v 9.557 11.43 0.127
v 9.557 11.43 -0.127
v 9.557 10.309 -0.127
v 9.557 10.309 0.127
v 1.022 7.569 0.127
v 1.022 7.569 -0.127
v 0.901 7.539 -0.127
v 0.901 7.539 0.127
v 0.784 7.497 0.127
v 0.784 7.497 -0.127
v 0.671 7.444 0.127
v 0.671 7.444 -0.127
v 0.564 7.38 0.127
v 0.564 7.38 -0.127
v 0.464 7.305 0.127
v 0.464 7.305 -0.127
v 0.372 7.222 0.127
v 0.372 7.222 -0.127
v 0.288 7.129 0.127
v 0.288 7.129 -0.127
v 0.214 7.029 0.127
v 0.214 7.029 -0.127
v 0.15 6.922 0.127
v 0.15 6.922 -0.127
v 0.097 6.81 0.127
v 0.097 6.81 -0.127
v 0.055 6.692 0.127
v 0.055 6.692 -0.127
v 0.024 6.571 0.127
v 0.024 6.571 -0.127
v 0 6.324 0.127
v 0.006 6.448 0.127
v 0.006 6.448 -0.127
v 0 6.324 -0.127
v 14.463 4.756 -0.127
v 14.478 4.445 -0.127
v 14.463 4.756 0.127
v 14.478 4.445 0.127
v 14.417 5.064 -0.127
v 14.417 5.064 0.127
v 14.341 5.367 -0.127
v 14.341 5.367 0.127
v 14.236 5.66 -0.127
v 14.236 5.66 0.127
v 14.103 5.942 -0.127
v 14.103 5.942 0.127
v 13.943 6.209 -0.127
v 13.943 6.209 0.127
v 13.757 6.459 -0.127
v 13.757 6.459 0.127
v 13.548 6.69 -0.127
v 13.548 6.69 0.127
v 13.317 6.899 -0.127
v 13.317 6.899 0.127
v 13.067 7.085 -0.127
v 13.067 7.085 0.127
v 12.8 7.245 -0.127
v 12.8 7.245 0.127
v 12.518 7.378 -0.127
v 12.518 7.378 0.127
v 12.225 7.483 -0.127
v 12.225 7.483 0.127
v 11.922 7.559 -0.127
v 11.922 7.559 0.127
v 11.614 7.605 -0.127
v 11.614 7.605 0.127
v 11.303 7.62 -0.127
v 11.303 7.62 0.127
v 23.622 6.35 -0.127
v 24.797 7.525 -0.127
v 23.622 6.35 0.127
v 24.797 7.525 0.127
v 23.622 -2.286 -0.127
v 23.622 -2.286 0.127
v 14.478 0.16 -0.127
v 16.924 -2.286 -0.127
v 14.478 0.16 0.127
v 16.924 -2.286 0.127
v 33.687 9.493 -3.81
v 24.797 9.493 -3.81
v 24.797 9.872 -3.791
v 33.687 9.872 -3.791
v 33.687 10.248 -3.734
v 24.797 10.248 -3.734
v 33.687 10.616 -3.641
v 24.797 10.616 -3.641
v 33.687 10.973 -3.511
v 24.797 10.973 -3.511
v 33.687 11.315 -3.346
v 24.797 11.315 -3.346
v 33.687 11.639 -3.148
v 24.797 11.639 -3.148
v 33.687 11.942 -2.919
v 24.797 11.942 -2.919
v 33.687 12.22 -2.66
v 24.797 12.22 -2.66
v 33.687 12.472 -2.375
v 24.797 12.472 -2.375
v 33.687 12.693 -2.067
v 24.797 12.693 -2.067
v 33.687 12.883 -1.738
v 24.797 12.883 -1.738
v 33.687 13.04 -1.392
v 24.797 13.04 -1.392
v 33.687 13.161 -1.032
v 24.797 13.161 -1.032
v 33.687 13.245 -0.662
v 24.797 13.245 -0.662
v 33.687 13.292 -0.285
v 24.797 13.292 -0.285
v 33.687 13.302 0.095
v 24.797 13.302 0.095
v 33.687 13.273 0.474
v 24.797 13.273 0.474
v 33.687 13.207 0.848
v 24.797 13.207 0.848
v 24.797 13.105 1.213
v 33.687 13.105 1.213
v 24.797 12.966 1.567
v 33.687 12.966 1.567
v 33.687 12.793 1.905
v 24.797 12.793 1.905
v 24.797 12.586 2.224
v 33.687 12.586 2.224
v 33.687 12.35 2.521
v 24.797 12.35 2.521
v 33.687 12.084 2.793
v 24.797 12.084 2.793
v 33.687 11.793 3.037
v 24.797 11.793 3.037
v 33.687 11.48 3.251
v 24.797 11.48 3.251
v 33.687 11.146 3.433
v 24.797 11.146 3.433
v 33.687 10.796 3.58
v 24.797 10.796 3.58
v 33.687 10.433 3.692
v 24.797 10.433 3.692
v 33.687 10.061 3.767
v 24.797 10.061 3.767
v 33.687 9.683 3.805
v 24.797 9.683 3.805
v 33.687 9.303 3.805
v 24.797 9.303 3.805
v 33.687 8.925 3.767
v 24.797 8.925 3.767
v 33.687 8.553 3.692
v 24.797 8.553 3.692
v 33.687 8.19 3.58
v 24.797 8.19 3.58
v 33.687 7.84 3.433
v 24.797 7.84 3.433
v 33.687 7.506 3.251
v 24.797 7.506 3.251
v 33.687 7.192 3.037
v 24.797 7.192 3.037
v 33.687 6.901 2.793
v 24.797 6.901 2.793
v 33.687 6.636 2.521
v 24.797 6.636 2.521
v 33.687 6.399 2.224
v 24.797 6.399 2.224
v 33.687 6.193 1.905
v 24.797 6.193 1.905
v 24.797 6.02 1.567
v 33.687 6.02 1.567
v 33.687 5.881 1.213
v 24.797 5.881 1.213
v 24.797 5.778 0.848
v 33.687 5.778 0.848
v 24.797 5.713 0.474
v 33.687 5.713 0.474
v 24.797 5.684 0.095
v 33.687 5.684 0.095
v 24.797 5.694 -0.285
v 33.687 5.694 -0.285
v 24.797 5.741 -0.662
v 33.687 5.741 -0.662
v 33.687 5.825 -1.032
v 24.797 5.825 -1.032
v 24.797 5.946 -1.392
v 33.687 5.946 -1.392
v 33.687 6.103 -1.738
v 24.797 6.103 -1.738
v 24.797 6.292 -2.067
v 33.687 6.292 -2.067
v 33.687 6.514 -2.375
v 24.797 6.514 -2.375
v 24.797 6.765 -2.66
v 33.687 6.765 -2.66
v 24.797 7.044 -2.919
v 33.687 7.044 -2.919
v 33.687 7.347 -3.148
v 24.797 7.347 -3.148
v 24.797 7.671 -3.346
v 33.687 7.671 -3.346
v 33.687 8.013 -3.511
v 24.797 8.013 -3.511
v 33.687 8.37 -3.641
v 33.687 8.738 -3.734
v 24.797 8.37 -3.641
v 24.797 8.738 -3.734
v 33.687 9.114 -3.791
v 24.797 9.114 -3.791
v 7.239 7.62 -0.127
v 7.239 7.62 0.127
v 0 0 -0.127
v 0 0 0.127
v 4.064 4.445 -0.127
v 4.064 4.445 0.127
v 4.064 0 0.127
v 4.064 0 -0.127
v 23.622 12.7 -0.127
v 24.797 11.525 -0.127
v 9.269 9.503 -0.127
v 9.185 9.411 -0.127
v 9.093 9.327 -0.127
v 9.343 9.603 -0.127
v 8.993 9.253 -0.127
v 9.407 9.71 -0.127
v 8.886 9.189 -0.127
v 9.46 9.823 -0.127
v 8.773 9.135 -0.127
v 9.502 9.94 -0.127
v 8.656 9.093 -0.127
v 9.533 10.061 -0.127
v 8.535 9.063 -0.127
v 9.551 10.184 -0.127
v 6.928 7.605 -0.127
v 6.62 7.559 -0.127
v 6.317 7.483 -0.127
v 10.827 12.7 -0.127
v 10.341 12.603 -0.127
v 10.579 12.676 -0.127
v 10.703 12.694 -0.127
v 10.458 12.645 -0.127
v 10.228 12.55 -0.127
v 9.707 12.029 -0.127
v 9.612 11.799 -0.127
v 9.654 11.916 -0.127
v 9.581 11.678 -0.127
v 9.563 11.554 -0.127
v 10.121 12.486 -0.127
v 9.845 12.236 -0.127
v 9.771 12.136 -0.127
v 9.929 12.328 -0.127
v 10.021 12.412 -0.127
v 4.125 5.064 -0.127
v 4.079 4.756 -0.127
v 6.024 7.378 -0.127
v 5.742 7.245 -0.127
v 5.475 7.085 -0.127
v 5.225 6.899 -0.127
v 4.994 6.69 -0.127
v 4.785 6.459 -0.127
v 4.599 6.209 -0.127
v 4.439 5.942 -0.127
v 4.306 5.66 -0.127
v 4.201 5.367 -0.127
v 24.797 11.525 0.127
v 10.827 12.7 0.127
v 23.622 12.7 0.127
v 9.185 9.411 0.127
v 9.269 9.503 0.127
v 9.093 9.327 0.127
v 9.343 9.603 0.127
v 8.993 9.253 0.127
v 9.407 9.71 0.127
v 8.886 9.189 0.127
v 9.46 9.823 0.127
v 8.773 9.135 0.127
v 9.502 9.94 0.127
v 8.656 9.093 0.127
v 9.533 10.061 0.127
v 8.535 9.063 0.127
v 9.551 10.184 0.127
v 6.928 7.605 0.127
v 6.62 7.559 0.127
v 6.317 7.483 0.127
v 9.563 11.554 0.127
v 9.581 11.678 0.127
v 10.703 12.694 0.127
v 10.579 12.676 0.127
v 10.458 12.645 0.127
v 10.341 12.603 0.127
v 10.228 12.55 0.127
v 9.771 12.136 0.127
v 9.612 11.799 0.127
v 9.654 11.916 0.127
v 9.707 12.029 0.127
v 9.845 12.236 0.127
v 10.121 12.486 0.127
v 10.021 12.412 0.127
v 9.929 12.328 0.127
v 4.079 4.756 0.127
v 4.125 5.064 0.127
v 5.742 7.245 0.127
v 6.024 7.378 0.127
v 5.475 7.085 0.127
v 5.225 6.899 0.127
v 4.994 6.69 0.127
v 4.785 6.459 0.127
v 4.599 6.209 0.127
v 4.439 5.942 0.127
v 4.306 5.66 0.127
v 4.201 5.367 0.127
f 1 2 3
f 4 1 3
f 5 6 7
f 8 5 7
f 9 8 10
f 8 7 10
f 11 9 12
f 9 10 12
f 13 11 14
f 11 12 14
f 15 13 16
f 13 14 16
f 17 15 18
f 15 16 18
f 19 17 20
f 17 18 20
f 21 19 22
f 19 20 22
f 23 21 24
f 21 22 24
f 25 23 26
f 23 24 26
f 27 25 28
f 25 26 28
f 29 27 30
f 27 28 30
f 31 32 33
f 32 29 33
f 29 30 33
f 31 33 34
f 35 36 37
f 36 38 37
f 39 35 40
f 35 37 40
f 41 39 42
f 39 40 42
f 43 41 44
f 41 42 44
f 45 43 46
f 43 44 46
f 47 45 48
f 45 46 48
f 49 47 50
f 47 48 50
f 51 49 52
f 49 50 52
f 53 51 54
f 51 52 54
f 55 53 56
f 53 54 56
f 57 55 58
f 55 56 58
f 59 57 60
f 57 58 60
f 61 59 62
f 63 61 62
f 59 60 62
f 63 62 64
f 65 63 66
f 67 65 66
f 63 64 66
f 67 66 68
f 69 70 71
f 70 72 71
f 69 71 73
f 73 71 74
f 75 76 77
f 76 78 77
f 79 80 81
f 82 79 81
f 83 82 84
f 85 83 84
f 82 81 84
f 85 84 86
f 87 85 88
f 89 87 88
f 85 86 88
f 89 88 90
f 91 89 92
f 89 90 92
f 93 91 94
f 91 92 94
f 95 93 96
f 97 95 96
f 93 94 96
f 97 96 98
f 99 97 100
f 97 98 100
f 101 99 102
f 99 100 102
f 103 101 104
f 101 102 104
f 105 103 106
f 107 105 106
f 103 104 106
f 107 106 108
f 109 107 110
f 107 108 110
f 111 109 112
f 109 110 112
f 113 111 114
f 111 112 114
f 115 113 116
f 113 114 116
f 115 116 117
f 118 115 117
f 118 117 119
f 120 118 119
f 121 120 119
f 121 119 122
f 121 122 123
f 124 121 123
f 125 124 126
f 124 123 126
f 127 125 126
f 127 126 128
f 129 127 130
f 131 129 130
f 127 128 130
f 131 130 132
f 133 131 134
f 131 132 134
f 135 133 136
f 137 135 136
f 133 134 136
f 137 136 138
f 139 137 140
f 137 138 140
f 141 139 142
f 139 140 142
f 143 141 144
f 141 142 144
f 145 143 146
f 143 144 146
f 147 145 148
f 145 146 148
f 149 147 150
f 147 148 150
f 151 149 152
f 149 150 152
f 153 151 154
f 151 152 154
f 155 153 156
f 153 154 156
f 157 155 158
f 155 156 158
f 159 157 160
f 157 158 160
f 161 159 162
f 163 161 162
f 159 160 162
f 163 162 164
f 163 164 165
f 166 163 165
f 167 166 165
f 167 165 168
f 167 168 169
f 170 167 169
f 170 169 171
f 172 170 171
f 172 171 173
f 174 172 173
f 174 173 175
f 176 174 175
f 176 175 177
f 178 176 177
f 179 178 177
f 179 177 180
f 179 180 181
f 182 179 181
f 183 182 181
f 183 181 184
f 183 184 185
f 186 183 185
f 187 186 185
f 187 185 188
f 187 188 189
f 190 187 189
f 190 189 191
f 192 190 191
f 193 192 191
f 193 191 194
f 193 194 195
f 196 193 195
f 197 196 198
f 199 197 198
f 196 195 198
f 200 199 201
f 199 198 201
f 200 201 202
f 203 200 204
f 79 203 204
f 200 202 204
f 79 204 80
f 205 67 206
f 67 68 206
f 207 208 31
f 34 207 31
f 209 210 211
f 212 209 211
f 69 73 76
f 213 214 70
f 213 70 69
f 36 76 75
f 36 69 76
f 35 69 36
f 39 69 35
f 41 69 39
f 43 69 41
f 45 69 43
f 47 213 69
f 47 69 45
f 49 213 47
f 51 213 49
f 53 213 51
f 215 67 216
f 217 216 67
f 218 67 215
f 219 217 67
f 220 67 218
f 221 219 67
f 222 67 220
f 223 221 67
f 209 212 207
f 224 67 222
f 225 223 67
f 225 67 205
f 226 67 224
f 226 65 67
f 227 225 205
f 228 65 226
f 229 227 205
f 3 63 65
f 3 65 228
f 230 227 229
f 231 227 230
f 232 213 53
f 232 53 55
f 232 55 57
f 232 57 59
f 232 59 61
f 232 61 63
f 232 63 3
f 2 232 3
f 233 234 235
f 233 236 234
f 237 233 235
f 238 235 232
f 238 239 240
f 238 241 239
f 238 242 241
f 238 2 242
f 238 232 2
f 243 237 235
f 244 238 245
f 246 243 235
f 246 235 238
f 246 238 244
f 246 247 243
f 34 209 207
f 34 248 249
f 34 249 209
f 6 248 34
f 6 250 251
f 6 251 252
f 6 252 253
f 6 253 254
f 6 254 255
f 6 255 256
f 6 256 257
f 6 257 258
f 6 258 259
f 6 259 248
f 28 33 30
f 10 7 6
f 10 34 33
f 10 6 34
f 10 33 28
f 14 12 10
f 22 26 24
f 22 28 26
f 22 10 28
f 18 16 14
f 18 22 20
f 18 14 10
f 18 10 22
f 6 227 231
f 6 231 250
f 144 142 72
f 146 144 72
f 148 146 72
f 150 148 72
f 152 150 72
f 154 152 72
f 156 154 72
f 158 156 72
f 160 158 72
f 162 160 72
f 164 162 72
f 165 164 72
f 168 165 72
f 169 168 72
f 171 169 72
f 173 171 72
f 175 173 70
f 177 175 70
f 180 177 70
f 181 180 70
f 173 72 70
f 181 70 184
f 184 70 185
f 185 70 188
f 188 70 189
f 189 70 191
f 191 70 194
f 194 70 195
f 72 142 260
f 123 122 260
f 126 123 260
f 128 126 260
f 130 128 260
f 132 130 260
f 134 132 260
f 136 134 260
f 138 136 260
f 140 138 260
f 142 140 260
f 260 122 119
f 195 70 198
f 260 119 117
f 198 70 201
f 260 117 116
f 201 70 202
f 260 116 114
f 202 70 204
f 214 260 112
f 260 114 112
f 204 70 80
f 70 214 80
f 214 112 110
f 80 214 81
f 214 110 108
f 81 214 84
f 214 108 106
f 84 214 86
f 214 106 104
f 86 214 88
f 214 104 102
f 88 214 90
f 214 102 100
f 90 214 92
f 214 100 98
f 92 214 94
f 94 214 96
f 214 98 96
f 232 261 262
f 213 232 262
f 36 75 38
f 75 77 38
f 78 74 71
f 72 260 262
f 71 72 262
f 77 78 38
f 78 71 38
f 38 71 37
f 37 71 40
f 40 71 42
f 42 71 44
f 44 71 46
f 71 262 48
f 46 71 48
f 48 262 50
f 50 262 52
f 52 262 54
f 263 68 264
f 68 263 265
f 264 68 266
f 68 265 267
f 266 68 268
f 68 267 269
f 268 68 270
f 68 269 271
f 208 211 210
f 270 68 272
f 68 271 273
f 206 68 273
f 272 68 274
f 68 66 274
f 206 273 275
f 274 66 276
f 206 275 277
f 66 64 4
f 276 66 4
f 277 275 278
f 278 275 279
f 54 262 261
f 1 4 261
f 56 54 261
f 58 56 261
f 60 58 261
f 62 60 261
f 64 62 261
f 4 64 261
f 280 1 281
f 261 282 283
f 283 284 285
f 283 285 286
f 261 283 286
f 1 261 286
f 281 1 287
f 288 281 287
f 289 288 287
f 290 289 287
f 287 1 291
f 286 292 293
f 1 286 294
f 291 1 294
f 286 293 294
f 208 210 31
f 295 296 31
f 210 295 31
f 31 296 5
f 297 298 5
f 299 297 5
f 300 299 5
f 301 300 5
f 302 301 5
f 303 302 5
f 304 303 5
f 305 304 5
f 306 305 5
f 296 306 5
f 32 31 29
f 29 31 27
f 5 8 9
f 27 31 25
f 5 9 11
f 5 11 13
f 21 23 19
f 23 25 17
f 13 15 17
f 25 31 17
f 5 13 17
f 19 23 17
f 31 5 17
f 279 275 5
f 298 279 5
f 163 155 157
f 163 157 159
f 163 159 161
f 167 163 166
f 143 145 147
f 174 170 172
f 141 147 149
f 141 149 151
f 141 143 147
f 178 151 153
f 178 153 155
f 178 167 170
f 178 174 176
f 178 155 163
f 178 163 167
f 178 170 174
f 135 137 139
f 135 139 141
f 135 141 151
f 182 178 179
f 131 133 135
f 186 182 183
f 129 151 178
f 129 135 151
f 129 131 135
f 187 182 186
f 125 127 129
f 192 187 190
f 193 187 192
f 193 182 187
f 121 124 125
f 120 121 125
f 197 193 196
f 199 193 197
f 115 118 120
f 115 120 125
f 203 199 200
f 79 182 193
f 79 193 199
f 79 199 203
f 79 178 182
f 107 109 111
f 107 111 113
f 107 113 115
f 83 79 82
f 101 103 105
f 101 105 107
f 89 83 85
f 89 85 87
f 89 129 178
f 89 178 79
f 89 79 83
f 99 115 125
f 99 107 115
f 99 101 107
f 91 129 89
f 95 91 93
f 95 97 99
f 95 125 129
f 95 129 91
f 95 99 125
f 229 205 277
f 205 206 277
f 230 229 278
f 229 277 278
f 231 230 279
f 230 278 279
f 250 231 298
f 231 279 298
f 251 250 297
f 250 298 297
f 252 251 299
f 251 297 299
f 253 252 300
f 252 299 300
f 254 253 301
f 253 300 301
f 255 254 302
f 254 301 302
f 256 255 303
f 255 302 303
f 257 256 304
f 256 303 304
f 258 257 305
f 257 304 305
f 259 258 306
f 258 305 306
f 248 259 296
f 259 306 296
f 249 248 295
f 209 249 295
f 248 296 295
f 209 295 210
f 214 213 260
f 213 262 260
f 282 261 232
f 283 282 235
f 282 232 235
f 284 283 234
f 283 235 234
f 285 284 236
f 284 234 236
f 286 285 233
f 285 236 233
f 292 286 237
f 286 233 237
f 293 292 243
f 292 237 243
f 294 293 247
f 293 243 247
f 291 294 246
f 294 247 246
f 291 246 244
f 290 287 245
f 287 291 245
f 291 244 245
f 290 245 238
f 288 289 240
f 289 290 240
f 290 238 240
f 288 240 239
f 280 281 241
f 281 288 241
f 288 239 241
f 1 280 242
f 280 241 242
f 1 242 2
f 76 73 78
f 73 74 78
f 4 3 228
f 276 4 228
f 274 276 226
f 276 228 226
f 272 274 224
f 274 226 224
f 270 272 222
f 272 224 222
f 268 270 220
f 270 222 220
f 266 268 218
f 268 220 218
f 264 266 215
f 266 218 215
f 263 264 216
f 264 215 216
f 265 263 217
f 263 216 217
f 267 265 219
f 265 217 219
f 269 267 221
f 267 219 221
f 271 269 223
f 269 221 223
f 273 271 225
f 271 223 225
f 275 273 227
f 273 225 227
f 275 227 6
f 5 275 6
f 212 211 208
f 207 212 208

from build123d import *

# Parameters (mm, degrees)
BOSS_EXTRUDE1_DEPTH = 0.127
SKETCH5_R           = 3.81
BOSS_EXTRUDE2_DEPTH = 8.89
CUT_EXTRUDE1_DEPTH  = 4.937
CUT_EXTRUDE3_DEPTH  = 2.54


with BuildPart() as part:
    # Sketch1 → Boss-Extrude1 (new body, symmetric)
    with BuildSketch(Plane.XY):
        with BuildLine():
            Line((0, 0), (0, 9.525))
            ThreePointArc((0, 9.525), (0.92993597, 11.77006403), (3.175, 12.7))
            Line((3.175, 12.7), (23.622, 12.7))
            Line((23.622, 12.7), (24.79704807, 11.52495193))
            Line((24.79704807, 11.52495193), (24.79704807, 7.52504807))
            Line((24.79704807, 7.52504807), (23.622, 6.35))
            Line((23.622, 6.35), (23.622, -2.286))
            Line((23.622, -2.286), (16.92369646, -2.286))
            Line((16.92369646, -2.286), (14.478, 0.15969646))
            Line((14.478, 0.15969646), (14.478, 4.445))
            ThreePointArc((14.478, 4.445), (13.54806403, 6.69006403), (11.303, 7.62))
            Line((11.303, 7.62), (7.239, 7.62))
            ThreePointArc((7.239, 7.62), (4.99393597, 6.69006403), (4.064, 4.445))
            Line((4.064, 4.445), (4.064, 0))
            Line((4.064, 0), (0, 0))
        make_face()
    extrude(amount=BOSS_EXTRUDE1_DEPTH, both=True)

    # Sketch5 → Boss-Extrude2 (add)
    with BuildSketch(Plane(origin=(24.79704807, 0, 0), x_dir=(0, 0, -1), z_dir=(1, 0, 0))):
        with Locations((0, 9.49295193)):
            Circle(SKETCH5_R)
    extrude(amount=BOSS_EXTRUDE2_DEPTH)

    # Sketch6 → Cut-Extrude1 (cut, through all)
    with BuildSketch(Plane.XY.offset(0.127)):
        Polygon((4.826, 10.922), (4.826, 8.382), (9.144, 9.652), align=None)
    extrude(amount=-CUT_EXTRUDE1_DEPTH, mode=Mode.SUBTRACT)

    # Sketch8 → Cut-Extrude3 (cut)
    with BuildSketch(Plane(origin=(0, 0, -0.127), x_dir=(-1, 0, 0), z_dir=(0, 0, -1))):
        with BuildLine():
            ThreePointArc((-10.82704807, 12.7), (-9.929022457, 12.328025612), (-9.55704807, 11.43))
            Line((-9.55704807, 11.43), (-9.55704807, 10.308777788))
            ThreePointArc((-9.55704807, 10.308777788), (-9.268748673, 9.503070692), (-8.534742676, 9.06316654))
            Line((-8.534742676, 9.06316654), (-1.022305393, 7.569289375))
            ThreePointArc((-1.022305393, 7.569289375), (-0.288299396, 7.129385223), (0, 6.323678127))
            Line((0, 6.323678127), (0, 9.525))
            ThreePointArc((0, 9.525), (-0.92993597, 11.77006403), (-3.175, 12.7))
            Line((-3.175, 12.7), (-10.82704807, 12.7))
        make_face()
        Polygon((-4.826, 8.382), (-9.144, 9.652), (-4.826, 10.922), align=None, mode=Mode.SUBTRACT)
    extrude(amount=-CUT_EXTRUDE3_DEPTH, mode=Mode.SUBTRACT)


solid = part.part
